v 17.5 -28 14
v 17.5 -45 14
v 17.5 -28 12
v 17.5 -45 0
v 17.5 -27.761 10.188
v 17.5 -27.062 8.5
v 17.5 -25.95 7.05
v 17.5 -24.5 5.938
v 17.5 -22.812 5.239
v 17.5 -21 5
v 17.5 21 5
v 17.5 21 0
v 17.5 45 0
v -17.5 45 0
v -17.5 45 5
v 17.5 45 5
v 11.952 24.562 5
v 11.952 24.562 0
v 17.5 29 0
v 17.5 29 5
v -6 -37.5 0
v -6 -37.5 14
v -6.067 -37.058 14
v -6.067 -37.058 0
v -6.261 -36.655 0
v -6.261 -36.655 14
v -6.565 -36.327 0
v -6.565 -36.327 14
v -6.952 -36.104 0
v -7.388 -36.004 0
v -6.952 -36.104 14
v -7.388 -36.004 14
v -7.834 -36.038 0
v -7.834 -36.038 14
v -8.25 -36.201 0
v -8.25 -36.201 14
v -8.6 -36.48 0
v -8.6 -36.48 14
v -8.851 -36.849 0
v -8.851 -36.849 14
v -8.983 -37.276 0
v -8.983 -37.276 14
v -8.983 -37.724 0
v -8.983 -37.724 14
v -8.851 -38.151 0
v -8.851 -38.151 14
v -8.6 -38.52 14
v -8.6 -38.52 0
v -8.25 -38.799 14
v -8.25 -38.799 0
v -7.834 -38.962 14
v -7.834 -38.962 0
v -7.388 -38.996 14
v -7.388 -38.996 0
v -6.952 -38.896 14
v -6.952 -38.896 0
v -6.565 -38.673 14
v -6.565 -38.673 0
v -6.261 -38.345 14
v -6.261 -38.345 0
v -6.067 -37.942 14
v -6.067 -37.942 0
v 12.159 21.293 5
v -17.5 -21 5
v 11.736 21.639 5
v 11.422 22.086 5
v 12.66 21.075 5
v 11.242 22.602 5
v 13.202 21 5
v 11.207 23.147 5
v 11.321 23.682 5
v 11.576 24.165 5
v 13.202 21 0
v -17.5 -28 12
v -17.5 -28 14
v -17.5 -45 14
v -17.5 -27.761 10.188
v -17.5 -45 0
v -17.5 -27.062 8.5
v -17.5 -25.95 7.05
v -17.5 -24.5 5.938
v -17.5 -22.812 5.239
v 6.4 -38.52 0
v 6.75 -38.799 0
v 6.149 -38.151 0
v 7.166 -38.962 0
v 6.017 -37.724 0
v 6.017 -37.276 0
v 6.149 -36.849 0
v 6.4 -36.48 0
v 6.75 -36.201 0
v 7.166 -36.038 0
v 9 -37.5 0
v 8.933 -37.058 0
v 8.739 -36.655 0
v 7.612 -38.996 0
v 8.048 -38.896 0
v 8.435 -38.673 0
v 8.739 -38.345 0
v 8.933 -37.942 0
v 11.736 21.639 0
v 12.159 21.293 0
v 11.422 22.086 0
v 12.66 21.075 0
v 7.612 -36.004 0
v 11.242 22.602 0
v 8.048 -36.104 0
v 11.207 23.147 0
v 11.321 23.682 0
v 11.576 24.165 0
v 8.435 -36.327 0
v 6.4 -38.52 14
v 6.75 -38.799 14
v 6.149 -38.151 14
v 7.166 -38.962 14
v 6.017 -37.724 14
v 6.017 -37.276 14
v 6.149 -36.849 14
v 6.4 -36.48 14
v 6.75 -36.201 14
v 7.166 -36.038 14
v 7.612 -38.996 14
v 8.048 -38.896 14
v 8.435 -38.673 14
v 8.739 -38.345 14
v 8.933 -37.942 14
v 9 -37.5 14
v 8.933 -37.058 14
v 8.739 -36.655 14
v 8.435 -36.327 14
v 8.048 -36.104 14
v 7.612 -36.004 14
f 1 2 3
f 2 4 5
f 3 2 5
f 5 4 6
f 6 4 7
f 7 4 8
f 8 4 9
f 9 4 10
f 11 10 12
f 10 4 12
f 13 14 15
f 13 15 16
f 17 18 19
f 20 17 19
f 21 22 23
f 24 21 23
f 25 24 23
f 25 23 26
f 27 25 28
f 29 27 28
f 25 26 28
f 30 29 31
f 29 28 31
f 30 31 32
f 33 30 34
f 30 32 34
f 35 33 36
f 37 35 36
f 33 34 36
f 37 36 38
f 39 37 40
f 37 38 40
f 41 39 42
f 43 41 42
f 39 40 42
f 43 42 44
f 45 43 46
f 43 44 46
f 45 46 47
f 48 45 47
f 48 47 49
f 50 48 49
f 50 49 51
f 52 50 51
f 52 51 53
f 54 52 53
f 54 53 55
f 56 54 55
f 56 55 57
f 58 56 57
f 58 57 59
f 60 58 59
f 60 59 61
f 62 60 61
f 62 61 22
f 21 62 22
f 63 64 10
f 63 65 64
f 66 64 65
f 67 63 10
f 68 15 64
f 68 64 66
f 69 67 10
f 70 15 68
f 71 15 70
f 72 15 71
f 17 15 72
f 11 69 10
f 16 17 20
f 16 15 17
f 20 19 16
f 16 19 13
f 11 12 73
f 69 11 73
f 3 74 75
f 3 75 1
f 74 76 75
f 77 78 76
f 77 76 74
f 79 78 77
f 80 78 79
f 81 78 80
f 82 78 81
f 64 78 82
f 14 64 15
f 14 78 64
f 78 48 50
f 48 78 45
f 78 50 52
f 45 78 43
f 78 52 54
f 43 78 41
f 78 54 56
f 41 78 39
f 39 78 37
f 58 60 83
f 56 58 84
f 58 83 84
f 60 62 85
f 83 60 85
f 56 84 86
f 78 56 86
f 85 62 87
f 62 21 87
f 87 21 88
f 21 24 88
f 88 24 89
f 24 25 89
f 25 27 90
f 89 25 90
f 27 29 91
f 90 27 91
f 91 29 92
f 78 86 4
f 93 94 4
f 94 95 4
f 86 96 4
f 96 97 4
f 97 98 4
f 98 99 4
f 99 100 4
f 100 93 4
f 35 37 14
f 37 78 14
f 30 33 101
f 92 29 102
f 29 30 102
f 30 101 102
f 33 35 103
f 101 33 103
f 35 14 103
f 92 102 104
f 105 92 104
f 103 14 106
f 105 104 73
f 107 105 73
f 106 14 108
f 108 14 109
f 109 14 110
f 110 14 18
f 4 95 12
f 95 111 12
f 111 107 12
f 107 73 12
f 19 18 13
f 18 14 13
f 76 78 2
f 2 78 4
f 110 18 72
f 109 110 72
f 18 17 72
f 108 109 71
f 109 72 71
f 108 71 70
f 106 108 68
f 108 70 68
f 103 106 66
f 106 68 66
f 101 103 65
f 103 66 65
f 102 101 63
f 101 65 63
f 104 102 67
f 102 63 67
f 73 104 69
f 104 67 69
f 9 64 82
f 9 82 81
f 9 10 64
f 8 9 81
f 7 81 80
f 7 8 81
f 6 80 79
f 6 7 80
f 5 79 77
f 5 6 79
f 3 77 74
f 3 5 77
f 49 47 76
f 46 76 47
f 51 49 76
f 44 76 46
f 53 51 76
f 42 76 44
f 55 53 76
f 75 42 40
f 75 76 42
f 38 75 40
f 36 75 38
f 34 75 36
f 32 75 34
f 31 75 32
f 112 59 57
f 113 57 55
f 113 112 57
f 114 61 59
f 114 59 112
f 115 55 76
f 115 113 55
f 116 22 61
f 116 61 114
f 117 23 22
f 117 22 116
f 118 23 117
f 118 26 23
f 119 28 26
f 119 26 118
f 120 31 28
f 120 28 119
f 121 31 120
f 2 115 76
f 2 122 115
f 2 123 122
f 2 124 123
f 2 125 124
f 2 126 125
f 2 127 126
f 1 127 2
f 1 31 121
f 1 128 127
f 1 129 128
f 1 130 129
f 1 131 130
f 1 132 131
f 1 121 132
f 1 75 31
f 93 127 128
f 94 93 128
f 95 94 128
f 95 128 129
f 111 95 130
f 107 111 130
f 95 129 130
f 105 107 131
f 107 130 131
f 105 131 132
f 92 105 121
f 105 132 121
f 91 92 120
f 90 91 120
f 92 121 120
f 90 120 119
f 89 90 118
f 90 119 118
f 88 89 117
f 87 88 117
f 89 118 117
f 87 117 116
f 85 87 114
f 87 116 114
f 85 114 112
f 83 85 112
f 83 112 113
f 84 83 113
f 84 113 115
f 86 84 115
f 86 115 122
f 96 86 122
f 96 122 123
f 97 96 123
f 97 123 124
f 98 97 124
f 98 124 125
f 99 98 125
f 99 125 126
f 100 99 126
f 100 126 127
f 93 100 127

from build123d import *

# Parameters (mm, degrees)
SKETCH_1_W          = 35
SKETCH_1_H          = 90
EXTRUDE_1_DEPTH     = 5
SKETCH_2_W          = 35
SKETCH_2_H          = 17
EXTRUDE_2_DEPTH     = 9
FILLET_1_R          = 7
SKETCH_3_R          = 1.5
CUT_EXTRUDE_3_DEPTH = 51.271761457
CUT_EXTRUDE_4_DEPTH = 51.271761457
FILLET_2_R          = 2


with BuildPart() as part:
    # 草图1 → 凸台-拉伸1 (new body)
    with BuildSketch(Plane.XY):
        Rectangle(SKETCH_1_W, SKETCH_1_H)
    extrude(amount=EXTRUDE_1_DEPTH)

    # 草图2 → 凸台-拉伸2 (add)
    with BuildSketch(Plane.XY.offset(5)):
        with Locations((0, -36.5)):
            Rectangle(SKETCH_2_W, SKETCH_2_H)
    extrude(amount=EXTRUDE_2_DEPTH)

    # 圆角1
    fillet_1_edges = [part.edges().sort_by_distance(p)[0] for p in [
        (0, -28, 5),
    ]]
    fillet(fillet_1_edges, radius=FILLET_1_R)

    # 草图3 → 切除-拉伸3 (cut, through all)
    with BuildSketch(Plane.XY.offset(14)):
        with Locations((-7.5, -37.5)):
            Circle(SKETCH_3_R)
        with Locations((7.5, -37.5)):
            Circle(SKETCH_3_R)
    extrude(amount=-CUT_EXTRUDE_3_DEPTH, mode=Mode.SUBTRACT)

    # 草图4 → 切除-拉伸4 (cut, through all)
    with BuildSketch(Plane(origin=(0, 0, 0), x_dir=(-1, 0, 0), z_dir=(0, 0, -1))):
        Polygon((-17.5, 29), (-17.5, 21), (-7.5, 21), align=None)
    extrude(amount=-CUT_EXTRUDE_4_DEPTH, mode=Mode.SUBTRACT)

    # 圆角2
    fillet_2_edges = [part.edges().sort_by_distance(p)[0] for p in [
        (7.5, 21, 2.5),
    ]]
    fillet(fillet_2_edges, radius=FILLET_2_R)


solid = part.part
